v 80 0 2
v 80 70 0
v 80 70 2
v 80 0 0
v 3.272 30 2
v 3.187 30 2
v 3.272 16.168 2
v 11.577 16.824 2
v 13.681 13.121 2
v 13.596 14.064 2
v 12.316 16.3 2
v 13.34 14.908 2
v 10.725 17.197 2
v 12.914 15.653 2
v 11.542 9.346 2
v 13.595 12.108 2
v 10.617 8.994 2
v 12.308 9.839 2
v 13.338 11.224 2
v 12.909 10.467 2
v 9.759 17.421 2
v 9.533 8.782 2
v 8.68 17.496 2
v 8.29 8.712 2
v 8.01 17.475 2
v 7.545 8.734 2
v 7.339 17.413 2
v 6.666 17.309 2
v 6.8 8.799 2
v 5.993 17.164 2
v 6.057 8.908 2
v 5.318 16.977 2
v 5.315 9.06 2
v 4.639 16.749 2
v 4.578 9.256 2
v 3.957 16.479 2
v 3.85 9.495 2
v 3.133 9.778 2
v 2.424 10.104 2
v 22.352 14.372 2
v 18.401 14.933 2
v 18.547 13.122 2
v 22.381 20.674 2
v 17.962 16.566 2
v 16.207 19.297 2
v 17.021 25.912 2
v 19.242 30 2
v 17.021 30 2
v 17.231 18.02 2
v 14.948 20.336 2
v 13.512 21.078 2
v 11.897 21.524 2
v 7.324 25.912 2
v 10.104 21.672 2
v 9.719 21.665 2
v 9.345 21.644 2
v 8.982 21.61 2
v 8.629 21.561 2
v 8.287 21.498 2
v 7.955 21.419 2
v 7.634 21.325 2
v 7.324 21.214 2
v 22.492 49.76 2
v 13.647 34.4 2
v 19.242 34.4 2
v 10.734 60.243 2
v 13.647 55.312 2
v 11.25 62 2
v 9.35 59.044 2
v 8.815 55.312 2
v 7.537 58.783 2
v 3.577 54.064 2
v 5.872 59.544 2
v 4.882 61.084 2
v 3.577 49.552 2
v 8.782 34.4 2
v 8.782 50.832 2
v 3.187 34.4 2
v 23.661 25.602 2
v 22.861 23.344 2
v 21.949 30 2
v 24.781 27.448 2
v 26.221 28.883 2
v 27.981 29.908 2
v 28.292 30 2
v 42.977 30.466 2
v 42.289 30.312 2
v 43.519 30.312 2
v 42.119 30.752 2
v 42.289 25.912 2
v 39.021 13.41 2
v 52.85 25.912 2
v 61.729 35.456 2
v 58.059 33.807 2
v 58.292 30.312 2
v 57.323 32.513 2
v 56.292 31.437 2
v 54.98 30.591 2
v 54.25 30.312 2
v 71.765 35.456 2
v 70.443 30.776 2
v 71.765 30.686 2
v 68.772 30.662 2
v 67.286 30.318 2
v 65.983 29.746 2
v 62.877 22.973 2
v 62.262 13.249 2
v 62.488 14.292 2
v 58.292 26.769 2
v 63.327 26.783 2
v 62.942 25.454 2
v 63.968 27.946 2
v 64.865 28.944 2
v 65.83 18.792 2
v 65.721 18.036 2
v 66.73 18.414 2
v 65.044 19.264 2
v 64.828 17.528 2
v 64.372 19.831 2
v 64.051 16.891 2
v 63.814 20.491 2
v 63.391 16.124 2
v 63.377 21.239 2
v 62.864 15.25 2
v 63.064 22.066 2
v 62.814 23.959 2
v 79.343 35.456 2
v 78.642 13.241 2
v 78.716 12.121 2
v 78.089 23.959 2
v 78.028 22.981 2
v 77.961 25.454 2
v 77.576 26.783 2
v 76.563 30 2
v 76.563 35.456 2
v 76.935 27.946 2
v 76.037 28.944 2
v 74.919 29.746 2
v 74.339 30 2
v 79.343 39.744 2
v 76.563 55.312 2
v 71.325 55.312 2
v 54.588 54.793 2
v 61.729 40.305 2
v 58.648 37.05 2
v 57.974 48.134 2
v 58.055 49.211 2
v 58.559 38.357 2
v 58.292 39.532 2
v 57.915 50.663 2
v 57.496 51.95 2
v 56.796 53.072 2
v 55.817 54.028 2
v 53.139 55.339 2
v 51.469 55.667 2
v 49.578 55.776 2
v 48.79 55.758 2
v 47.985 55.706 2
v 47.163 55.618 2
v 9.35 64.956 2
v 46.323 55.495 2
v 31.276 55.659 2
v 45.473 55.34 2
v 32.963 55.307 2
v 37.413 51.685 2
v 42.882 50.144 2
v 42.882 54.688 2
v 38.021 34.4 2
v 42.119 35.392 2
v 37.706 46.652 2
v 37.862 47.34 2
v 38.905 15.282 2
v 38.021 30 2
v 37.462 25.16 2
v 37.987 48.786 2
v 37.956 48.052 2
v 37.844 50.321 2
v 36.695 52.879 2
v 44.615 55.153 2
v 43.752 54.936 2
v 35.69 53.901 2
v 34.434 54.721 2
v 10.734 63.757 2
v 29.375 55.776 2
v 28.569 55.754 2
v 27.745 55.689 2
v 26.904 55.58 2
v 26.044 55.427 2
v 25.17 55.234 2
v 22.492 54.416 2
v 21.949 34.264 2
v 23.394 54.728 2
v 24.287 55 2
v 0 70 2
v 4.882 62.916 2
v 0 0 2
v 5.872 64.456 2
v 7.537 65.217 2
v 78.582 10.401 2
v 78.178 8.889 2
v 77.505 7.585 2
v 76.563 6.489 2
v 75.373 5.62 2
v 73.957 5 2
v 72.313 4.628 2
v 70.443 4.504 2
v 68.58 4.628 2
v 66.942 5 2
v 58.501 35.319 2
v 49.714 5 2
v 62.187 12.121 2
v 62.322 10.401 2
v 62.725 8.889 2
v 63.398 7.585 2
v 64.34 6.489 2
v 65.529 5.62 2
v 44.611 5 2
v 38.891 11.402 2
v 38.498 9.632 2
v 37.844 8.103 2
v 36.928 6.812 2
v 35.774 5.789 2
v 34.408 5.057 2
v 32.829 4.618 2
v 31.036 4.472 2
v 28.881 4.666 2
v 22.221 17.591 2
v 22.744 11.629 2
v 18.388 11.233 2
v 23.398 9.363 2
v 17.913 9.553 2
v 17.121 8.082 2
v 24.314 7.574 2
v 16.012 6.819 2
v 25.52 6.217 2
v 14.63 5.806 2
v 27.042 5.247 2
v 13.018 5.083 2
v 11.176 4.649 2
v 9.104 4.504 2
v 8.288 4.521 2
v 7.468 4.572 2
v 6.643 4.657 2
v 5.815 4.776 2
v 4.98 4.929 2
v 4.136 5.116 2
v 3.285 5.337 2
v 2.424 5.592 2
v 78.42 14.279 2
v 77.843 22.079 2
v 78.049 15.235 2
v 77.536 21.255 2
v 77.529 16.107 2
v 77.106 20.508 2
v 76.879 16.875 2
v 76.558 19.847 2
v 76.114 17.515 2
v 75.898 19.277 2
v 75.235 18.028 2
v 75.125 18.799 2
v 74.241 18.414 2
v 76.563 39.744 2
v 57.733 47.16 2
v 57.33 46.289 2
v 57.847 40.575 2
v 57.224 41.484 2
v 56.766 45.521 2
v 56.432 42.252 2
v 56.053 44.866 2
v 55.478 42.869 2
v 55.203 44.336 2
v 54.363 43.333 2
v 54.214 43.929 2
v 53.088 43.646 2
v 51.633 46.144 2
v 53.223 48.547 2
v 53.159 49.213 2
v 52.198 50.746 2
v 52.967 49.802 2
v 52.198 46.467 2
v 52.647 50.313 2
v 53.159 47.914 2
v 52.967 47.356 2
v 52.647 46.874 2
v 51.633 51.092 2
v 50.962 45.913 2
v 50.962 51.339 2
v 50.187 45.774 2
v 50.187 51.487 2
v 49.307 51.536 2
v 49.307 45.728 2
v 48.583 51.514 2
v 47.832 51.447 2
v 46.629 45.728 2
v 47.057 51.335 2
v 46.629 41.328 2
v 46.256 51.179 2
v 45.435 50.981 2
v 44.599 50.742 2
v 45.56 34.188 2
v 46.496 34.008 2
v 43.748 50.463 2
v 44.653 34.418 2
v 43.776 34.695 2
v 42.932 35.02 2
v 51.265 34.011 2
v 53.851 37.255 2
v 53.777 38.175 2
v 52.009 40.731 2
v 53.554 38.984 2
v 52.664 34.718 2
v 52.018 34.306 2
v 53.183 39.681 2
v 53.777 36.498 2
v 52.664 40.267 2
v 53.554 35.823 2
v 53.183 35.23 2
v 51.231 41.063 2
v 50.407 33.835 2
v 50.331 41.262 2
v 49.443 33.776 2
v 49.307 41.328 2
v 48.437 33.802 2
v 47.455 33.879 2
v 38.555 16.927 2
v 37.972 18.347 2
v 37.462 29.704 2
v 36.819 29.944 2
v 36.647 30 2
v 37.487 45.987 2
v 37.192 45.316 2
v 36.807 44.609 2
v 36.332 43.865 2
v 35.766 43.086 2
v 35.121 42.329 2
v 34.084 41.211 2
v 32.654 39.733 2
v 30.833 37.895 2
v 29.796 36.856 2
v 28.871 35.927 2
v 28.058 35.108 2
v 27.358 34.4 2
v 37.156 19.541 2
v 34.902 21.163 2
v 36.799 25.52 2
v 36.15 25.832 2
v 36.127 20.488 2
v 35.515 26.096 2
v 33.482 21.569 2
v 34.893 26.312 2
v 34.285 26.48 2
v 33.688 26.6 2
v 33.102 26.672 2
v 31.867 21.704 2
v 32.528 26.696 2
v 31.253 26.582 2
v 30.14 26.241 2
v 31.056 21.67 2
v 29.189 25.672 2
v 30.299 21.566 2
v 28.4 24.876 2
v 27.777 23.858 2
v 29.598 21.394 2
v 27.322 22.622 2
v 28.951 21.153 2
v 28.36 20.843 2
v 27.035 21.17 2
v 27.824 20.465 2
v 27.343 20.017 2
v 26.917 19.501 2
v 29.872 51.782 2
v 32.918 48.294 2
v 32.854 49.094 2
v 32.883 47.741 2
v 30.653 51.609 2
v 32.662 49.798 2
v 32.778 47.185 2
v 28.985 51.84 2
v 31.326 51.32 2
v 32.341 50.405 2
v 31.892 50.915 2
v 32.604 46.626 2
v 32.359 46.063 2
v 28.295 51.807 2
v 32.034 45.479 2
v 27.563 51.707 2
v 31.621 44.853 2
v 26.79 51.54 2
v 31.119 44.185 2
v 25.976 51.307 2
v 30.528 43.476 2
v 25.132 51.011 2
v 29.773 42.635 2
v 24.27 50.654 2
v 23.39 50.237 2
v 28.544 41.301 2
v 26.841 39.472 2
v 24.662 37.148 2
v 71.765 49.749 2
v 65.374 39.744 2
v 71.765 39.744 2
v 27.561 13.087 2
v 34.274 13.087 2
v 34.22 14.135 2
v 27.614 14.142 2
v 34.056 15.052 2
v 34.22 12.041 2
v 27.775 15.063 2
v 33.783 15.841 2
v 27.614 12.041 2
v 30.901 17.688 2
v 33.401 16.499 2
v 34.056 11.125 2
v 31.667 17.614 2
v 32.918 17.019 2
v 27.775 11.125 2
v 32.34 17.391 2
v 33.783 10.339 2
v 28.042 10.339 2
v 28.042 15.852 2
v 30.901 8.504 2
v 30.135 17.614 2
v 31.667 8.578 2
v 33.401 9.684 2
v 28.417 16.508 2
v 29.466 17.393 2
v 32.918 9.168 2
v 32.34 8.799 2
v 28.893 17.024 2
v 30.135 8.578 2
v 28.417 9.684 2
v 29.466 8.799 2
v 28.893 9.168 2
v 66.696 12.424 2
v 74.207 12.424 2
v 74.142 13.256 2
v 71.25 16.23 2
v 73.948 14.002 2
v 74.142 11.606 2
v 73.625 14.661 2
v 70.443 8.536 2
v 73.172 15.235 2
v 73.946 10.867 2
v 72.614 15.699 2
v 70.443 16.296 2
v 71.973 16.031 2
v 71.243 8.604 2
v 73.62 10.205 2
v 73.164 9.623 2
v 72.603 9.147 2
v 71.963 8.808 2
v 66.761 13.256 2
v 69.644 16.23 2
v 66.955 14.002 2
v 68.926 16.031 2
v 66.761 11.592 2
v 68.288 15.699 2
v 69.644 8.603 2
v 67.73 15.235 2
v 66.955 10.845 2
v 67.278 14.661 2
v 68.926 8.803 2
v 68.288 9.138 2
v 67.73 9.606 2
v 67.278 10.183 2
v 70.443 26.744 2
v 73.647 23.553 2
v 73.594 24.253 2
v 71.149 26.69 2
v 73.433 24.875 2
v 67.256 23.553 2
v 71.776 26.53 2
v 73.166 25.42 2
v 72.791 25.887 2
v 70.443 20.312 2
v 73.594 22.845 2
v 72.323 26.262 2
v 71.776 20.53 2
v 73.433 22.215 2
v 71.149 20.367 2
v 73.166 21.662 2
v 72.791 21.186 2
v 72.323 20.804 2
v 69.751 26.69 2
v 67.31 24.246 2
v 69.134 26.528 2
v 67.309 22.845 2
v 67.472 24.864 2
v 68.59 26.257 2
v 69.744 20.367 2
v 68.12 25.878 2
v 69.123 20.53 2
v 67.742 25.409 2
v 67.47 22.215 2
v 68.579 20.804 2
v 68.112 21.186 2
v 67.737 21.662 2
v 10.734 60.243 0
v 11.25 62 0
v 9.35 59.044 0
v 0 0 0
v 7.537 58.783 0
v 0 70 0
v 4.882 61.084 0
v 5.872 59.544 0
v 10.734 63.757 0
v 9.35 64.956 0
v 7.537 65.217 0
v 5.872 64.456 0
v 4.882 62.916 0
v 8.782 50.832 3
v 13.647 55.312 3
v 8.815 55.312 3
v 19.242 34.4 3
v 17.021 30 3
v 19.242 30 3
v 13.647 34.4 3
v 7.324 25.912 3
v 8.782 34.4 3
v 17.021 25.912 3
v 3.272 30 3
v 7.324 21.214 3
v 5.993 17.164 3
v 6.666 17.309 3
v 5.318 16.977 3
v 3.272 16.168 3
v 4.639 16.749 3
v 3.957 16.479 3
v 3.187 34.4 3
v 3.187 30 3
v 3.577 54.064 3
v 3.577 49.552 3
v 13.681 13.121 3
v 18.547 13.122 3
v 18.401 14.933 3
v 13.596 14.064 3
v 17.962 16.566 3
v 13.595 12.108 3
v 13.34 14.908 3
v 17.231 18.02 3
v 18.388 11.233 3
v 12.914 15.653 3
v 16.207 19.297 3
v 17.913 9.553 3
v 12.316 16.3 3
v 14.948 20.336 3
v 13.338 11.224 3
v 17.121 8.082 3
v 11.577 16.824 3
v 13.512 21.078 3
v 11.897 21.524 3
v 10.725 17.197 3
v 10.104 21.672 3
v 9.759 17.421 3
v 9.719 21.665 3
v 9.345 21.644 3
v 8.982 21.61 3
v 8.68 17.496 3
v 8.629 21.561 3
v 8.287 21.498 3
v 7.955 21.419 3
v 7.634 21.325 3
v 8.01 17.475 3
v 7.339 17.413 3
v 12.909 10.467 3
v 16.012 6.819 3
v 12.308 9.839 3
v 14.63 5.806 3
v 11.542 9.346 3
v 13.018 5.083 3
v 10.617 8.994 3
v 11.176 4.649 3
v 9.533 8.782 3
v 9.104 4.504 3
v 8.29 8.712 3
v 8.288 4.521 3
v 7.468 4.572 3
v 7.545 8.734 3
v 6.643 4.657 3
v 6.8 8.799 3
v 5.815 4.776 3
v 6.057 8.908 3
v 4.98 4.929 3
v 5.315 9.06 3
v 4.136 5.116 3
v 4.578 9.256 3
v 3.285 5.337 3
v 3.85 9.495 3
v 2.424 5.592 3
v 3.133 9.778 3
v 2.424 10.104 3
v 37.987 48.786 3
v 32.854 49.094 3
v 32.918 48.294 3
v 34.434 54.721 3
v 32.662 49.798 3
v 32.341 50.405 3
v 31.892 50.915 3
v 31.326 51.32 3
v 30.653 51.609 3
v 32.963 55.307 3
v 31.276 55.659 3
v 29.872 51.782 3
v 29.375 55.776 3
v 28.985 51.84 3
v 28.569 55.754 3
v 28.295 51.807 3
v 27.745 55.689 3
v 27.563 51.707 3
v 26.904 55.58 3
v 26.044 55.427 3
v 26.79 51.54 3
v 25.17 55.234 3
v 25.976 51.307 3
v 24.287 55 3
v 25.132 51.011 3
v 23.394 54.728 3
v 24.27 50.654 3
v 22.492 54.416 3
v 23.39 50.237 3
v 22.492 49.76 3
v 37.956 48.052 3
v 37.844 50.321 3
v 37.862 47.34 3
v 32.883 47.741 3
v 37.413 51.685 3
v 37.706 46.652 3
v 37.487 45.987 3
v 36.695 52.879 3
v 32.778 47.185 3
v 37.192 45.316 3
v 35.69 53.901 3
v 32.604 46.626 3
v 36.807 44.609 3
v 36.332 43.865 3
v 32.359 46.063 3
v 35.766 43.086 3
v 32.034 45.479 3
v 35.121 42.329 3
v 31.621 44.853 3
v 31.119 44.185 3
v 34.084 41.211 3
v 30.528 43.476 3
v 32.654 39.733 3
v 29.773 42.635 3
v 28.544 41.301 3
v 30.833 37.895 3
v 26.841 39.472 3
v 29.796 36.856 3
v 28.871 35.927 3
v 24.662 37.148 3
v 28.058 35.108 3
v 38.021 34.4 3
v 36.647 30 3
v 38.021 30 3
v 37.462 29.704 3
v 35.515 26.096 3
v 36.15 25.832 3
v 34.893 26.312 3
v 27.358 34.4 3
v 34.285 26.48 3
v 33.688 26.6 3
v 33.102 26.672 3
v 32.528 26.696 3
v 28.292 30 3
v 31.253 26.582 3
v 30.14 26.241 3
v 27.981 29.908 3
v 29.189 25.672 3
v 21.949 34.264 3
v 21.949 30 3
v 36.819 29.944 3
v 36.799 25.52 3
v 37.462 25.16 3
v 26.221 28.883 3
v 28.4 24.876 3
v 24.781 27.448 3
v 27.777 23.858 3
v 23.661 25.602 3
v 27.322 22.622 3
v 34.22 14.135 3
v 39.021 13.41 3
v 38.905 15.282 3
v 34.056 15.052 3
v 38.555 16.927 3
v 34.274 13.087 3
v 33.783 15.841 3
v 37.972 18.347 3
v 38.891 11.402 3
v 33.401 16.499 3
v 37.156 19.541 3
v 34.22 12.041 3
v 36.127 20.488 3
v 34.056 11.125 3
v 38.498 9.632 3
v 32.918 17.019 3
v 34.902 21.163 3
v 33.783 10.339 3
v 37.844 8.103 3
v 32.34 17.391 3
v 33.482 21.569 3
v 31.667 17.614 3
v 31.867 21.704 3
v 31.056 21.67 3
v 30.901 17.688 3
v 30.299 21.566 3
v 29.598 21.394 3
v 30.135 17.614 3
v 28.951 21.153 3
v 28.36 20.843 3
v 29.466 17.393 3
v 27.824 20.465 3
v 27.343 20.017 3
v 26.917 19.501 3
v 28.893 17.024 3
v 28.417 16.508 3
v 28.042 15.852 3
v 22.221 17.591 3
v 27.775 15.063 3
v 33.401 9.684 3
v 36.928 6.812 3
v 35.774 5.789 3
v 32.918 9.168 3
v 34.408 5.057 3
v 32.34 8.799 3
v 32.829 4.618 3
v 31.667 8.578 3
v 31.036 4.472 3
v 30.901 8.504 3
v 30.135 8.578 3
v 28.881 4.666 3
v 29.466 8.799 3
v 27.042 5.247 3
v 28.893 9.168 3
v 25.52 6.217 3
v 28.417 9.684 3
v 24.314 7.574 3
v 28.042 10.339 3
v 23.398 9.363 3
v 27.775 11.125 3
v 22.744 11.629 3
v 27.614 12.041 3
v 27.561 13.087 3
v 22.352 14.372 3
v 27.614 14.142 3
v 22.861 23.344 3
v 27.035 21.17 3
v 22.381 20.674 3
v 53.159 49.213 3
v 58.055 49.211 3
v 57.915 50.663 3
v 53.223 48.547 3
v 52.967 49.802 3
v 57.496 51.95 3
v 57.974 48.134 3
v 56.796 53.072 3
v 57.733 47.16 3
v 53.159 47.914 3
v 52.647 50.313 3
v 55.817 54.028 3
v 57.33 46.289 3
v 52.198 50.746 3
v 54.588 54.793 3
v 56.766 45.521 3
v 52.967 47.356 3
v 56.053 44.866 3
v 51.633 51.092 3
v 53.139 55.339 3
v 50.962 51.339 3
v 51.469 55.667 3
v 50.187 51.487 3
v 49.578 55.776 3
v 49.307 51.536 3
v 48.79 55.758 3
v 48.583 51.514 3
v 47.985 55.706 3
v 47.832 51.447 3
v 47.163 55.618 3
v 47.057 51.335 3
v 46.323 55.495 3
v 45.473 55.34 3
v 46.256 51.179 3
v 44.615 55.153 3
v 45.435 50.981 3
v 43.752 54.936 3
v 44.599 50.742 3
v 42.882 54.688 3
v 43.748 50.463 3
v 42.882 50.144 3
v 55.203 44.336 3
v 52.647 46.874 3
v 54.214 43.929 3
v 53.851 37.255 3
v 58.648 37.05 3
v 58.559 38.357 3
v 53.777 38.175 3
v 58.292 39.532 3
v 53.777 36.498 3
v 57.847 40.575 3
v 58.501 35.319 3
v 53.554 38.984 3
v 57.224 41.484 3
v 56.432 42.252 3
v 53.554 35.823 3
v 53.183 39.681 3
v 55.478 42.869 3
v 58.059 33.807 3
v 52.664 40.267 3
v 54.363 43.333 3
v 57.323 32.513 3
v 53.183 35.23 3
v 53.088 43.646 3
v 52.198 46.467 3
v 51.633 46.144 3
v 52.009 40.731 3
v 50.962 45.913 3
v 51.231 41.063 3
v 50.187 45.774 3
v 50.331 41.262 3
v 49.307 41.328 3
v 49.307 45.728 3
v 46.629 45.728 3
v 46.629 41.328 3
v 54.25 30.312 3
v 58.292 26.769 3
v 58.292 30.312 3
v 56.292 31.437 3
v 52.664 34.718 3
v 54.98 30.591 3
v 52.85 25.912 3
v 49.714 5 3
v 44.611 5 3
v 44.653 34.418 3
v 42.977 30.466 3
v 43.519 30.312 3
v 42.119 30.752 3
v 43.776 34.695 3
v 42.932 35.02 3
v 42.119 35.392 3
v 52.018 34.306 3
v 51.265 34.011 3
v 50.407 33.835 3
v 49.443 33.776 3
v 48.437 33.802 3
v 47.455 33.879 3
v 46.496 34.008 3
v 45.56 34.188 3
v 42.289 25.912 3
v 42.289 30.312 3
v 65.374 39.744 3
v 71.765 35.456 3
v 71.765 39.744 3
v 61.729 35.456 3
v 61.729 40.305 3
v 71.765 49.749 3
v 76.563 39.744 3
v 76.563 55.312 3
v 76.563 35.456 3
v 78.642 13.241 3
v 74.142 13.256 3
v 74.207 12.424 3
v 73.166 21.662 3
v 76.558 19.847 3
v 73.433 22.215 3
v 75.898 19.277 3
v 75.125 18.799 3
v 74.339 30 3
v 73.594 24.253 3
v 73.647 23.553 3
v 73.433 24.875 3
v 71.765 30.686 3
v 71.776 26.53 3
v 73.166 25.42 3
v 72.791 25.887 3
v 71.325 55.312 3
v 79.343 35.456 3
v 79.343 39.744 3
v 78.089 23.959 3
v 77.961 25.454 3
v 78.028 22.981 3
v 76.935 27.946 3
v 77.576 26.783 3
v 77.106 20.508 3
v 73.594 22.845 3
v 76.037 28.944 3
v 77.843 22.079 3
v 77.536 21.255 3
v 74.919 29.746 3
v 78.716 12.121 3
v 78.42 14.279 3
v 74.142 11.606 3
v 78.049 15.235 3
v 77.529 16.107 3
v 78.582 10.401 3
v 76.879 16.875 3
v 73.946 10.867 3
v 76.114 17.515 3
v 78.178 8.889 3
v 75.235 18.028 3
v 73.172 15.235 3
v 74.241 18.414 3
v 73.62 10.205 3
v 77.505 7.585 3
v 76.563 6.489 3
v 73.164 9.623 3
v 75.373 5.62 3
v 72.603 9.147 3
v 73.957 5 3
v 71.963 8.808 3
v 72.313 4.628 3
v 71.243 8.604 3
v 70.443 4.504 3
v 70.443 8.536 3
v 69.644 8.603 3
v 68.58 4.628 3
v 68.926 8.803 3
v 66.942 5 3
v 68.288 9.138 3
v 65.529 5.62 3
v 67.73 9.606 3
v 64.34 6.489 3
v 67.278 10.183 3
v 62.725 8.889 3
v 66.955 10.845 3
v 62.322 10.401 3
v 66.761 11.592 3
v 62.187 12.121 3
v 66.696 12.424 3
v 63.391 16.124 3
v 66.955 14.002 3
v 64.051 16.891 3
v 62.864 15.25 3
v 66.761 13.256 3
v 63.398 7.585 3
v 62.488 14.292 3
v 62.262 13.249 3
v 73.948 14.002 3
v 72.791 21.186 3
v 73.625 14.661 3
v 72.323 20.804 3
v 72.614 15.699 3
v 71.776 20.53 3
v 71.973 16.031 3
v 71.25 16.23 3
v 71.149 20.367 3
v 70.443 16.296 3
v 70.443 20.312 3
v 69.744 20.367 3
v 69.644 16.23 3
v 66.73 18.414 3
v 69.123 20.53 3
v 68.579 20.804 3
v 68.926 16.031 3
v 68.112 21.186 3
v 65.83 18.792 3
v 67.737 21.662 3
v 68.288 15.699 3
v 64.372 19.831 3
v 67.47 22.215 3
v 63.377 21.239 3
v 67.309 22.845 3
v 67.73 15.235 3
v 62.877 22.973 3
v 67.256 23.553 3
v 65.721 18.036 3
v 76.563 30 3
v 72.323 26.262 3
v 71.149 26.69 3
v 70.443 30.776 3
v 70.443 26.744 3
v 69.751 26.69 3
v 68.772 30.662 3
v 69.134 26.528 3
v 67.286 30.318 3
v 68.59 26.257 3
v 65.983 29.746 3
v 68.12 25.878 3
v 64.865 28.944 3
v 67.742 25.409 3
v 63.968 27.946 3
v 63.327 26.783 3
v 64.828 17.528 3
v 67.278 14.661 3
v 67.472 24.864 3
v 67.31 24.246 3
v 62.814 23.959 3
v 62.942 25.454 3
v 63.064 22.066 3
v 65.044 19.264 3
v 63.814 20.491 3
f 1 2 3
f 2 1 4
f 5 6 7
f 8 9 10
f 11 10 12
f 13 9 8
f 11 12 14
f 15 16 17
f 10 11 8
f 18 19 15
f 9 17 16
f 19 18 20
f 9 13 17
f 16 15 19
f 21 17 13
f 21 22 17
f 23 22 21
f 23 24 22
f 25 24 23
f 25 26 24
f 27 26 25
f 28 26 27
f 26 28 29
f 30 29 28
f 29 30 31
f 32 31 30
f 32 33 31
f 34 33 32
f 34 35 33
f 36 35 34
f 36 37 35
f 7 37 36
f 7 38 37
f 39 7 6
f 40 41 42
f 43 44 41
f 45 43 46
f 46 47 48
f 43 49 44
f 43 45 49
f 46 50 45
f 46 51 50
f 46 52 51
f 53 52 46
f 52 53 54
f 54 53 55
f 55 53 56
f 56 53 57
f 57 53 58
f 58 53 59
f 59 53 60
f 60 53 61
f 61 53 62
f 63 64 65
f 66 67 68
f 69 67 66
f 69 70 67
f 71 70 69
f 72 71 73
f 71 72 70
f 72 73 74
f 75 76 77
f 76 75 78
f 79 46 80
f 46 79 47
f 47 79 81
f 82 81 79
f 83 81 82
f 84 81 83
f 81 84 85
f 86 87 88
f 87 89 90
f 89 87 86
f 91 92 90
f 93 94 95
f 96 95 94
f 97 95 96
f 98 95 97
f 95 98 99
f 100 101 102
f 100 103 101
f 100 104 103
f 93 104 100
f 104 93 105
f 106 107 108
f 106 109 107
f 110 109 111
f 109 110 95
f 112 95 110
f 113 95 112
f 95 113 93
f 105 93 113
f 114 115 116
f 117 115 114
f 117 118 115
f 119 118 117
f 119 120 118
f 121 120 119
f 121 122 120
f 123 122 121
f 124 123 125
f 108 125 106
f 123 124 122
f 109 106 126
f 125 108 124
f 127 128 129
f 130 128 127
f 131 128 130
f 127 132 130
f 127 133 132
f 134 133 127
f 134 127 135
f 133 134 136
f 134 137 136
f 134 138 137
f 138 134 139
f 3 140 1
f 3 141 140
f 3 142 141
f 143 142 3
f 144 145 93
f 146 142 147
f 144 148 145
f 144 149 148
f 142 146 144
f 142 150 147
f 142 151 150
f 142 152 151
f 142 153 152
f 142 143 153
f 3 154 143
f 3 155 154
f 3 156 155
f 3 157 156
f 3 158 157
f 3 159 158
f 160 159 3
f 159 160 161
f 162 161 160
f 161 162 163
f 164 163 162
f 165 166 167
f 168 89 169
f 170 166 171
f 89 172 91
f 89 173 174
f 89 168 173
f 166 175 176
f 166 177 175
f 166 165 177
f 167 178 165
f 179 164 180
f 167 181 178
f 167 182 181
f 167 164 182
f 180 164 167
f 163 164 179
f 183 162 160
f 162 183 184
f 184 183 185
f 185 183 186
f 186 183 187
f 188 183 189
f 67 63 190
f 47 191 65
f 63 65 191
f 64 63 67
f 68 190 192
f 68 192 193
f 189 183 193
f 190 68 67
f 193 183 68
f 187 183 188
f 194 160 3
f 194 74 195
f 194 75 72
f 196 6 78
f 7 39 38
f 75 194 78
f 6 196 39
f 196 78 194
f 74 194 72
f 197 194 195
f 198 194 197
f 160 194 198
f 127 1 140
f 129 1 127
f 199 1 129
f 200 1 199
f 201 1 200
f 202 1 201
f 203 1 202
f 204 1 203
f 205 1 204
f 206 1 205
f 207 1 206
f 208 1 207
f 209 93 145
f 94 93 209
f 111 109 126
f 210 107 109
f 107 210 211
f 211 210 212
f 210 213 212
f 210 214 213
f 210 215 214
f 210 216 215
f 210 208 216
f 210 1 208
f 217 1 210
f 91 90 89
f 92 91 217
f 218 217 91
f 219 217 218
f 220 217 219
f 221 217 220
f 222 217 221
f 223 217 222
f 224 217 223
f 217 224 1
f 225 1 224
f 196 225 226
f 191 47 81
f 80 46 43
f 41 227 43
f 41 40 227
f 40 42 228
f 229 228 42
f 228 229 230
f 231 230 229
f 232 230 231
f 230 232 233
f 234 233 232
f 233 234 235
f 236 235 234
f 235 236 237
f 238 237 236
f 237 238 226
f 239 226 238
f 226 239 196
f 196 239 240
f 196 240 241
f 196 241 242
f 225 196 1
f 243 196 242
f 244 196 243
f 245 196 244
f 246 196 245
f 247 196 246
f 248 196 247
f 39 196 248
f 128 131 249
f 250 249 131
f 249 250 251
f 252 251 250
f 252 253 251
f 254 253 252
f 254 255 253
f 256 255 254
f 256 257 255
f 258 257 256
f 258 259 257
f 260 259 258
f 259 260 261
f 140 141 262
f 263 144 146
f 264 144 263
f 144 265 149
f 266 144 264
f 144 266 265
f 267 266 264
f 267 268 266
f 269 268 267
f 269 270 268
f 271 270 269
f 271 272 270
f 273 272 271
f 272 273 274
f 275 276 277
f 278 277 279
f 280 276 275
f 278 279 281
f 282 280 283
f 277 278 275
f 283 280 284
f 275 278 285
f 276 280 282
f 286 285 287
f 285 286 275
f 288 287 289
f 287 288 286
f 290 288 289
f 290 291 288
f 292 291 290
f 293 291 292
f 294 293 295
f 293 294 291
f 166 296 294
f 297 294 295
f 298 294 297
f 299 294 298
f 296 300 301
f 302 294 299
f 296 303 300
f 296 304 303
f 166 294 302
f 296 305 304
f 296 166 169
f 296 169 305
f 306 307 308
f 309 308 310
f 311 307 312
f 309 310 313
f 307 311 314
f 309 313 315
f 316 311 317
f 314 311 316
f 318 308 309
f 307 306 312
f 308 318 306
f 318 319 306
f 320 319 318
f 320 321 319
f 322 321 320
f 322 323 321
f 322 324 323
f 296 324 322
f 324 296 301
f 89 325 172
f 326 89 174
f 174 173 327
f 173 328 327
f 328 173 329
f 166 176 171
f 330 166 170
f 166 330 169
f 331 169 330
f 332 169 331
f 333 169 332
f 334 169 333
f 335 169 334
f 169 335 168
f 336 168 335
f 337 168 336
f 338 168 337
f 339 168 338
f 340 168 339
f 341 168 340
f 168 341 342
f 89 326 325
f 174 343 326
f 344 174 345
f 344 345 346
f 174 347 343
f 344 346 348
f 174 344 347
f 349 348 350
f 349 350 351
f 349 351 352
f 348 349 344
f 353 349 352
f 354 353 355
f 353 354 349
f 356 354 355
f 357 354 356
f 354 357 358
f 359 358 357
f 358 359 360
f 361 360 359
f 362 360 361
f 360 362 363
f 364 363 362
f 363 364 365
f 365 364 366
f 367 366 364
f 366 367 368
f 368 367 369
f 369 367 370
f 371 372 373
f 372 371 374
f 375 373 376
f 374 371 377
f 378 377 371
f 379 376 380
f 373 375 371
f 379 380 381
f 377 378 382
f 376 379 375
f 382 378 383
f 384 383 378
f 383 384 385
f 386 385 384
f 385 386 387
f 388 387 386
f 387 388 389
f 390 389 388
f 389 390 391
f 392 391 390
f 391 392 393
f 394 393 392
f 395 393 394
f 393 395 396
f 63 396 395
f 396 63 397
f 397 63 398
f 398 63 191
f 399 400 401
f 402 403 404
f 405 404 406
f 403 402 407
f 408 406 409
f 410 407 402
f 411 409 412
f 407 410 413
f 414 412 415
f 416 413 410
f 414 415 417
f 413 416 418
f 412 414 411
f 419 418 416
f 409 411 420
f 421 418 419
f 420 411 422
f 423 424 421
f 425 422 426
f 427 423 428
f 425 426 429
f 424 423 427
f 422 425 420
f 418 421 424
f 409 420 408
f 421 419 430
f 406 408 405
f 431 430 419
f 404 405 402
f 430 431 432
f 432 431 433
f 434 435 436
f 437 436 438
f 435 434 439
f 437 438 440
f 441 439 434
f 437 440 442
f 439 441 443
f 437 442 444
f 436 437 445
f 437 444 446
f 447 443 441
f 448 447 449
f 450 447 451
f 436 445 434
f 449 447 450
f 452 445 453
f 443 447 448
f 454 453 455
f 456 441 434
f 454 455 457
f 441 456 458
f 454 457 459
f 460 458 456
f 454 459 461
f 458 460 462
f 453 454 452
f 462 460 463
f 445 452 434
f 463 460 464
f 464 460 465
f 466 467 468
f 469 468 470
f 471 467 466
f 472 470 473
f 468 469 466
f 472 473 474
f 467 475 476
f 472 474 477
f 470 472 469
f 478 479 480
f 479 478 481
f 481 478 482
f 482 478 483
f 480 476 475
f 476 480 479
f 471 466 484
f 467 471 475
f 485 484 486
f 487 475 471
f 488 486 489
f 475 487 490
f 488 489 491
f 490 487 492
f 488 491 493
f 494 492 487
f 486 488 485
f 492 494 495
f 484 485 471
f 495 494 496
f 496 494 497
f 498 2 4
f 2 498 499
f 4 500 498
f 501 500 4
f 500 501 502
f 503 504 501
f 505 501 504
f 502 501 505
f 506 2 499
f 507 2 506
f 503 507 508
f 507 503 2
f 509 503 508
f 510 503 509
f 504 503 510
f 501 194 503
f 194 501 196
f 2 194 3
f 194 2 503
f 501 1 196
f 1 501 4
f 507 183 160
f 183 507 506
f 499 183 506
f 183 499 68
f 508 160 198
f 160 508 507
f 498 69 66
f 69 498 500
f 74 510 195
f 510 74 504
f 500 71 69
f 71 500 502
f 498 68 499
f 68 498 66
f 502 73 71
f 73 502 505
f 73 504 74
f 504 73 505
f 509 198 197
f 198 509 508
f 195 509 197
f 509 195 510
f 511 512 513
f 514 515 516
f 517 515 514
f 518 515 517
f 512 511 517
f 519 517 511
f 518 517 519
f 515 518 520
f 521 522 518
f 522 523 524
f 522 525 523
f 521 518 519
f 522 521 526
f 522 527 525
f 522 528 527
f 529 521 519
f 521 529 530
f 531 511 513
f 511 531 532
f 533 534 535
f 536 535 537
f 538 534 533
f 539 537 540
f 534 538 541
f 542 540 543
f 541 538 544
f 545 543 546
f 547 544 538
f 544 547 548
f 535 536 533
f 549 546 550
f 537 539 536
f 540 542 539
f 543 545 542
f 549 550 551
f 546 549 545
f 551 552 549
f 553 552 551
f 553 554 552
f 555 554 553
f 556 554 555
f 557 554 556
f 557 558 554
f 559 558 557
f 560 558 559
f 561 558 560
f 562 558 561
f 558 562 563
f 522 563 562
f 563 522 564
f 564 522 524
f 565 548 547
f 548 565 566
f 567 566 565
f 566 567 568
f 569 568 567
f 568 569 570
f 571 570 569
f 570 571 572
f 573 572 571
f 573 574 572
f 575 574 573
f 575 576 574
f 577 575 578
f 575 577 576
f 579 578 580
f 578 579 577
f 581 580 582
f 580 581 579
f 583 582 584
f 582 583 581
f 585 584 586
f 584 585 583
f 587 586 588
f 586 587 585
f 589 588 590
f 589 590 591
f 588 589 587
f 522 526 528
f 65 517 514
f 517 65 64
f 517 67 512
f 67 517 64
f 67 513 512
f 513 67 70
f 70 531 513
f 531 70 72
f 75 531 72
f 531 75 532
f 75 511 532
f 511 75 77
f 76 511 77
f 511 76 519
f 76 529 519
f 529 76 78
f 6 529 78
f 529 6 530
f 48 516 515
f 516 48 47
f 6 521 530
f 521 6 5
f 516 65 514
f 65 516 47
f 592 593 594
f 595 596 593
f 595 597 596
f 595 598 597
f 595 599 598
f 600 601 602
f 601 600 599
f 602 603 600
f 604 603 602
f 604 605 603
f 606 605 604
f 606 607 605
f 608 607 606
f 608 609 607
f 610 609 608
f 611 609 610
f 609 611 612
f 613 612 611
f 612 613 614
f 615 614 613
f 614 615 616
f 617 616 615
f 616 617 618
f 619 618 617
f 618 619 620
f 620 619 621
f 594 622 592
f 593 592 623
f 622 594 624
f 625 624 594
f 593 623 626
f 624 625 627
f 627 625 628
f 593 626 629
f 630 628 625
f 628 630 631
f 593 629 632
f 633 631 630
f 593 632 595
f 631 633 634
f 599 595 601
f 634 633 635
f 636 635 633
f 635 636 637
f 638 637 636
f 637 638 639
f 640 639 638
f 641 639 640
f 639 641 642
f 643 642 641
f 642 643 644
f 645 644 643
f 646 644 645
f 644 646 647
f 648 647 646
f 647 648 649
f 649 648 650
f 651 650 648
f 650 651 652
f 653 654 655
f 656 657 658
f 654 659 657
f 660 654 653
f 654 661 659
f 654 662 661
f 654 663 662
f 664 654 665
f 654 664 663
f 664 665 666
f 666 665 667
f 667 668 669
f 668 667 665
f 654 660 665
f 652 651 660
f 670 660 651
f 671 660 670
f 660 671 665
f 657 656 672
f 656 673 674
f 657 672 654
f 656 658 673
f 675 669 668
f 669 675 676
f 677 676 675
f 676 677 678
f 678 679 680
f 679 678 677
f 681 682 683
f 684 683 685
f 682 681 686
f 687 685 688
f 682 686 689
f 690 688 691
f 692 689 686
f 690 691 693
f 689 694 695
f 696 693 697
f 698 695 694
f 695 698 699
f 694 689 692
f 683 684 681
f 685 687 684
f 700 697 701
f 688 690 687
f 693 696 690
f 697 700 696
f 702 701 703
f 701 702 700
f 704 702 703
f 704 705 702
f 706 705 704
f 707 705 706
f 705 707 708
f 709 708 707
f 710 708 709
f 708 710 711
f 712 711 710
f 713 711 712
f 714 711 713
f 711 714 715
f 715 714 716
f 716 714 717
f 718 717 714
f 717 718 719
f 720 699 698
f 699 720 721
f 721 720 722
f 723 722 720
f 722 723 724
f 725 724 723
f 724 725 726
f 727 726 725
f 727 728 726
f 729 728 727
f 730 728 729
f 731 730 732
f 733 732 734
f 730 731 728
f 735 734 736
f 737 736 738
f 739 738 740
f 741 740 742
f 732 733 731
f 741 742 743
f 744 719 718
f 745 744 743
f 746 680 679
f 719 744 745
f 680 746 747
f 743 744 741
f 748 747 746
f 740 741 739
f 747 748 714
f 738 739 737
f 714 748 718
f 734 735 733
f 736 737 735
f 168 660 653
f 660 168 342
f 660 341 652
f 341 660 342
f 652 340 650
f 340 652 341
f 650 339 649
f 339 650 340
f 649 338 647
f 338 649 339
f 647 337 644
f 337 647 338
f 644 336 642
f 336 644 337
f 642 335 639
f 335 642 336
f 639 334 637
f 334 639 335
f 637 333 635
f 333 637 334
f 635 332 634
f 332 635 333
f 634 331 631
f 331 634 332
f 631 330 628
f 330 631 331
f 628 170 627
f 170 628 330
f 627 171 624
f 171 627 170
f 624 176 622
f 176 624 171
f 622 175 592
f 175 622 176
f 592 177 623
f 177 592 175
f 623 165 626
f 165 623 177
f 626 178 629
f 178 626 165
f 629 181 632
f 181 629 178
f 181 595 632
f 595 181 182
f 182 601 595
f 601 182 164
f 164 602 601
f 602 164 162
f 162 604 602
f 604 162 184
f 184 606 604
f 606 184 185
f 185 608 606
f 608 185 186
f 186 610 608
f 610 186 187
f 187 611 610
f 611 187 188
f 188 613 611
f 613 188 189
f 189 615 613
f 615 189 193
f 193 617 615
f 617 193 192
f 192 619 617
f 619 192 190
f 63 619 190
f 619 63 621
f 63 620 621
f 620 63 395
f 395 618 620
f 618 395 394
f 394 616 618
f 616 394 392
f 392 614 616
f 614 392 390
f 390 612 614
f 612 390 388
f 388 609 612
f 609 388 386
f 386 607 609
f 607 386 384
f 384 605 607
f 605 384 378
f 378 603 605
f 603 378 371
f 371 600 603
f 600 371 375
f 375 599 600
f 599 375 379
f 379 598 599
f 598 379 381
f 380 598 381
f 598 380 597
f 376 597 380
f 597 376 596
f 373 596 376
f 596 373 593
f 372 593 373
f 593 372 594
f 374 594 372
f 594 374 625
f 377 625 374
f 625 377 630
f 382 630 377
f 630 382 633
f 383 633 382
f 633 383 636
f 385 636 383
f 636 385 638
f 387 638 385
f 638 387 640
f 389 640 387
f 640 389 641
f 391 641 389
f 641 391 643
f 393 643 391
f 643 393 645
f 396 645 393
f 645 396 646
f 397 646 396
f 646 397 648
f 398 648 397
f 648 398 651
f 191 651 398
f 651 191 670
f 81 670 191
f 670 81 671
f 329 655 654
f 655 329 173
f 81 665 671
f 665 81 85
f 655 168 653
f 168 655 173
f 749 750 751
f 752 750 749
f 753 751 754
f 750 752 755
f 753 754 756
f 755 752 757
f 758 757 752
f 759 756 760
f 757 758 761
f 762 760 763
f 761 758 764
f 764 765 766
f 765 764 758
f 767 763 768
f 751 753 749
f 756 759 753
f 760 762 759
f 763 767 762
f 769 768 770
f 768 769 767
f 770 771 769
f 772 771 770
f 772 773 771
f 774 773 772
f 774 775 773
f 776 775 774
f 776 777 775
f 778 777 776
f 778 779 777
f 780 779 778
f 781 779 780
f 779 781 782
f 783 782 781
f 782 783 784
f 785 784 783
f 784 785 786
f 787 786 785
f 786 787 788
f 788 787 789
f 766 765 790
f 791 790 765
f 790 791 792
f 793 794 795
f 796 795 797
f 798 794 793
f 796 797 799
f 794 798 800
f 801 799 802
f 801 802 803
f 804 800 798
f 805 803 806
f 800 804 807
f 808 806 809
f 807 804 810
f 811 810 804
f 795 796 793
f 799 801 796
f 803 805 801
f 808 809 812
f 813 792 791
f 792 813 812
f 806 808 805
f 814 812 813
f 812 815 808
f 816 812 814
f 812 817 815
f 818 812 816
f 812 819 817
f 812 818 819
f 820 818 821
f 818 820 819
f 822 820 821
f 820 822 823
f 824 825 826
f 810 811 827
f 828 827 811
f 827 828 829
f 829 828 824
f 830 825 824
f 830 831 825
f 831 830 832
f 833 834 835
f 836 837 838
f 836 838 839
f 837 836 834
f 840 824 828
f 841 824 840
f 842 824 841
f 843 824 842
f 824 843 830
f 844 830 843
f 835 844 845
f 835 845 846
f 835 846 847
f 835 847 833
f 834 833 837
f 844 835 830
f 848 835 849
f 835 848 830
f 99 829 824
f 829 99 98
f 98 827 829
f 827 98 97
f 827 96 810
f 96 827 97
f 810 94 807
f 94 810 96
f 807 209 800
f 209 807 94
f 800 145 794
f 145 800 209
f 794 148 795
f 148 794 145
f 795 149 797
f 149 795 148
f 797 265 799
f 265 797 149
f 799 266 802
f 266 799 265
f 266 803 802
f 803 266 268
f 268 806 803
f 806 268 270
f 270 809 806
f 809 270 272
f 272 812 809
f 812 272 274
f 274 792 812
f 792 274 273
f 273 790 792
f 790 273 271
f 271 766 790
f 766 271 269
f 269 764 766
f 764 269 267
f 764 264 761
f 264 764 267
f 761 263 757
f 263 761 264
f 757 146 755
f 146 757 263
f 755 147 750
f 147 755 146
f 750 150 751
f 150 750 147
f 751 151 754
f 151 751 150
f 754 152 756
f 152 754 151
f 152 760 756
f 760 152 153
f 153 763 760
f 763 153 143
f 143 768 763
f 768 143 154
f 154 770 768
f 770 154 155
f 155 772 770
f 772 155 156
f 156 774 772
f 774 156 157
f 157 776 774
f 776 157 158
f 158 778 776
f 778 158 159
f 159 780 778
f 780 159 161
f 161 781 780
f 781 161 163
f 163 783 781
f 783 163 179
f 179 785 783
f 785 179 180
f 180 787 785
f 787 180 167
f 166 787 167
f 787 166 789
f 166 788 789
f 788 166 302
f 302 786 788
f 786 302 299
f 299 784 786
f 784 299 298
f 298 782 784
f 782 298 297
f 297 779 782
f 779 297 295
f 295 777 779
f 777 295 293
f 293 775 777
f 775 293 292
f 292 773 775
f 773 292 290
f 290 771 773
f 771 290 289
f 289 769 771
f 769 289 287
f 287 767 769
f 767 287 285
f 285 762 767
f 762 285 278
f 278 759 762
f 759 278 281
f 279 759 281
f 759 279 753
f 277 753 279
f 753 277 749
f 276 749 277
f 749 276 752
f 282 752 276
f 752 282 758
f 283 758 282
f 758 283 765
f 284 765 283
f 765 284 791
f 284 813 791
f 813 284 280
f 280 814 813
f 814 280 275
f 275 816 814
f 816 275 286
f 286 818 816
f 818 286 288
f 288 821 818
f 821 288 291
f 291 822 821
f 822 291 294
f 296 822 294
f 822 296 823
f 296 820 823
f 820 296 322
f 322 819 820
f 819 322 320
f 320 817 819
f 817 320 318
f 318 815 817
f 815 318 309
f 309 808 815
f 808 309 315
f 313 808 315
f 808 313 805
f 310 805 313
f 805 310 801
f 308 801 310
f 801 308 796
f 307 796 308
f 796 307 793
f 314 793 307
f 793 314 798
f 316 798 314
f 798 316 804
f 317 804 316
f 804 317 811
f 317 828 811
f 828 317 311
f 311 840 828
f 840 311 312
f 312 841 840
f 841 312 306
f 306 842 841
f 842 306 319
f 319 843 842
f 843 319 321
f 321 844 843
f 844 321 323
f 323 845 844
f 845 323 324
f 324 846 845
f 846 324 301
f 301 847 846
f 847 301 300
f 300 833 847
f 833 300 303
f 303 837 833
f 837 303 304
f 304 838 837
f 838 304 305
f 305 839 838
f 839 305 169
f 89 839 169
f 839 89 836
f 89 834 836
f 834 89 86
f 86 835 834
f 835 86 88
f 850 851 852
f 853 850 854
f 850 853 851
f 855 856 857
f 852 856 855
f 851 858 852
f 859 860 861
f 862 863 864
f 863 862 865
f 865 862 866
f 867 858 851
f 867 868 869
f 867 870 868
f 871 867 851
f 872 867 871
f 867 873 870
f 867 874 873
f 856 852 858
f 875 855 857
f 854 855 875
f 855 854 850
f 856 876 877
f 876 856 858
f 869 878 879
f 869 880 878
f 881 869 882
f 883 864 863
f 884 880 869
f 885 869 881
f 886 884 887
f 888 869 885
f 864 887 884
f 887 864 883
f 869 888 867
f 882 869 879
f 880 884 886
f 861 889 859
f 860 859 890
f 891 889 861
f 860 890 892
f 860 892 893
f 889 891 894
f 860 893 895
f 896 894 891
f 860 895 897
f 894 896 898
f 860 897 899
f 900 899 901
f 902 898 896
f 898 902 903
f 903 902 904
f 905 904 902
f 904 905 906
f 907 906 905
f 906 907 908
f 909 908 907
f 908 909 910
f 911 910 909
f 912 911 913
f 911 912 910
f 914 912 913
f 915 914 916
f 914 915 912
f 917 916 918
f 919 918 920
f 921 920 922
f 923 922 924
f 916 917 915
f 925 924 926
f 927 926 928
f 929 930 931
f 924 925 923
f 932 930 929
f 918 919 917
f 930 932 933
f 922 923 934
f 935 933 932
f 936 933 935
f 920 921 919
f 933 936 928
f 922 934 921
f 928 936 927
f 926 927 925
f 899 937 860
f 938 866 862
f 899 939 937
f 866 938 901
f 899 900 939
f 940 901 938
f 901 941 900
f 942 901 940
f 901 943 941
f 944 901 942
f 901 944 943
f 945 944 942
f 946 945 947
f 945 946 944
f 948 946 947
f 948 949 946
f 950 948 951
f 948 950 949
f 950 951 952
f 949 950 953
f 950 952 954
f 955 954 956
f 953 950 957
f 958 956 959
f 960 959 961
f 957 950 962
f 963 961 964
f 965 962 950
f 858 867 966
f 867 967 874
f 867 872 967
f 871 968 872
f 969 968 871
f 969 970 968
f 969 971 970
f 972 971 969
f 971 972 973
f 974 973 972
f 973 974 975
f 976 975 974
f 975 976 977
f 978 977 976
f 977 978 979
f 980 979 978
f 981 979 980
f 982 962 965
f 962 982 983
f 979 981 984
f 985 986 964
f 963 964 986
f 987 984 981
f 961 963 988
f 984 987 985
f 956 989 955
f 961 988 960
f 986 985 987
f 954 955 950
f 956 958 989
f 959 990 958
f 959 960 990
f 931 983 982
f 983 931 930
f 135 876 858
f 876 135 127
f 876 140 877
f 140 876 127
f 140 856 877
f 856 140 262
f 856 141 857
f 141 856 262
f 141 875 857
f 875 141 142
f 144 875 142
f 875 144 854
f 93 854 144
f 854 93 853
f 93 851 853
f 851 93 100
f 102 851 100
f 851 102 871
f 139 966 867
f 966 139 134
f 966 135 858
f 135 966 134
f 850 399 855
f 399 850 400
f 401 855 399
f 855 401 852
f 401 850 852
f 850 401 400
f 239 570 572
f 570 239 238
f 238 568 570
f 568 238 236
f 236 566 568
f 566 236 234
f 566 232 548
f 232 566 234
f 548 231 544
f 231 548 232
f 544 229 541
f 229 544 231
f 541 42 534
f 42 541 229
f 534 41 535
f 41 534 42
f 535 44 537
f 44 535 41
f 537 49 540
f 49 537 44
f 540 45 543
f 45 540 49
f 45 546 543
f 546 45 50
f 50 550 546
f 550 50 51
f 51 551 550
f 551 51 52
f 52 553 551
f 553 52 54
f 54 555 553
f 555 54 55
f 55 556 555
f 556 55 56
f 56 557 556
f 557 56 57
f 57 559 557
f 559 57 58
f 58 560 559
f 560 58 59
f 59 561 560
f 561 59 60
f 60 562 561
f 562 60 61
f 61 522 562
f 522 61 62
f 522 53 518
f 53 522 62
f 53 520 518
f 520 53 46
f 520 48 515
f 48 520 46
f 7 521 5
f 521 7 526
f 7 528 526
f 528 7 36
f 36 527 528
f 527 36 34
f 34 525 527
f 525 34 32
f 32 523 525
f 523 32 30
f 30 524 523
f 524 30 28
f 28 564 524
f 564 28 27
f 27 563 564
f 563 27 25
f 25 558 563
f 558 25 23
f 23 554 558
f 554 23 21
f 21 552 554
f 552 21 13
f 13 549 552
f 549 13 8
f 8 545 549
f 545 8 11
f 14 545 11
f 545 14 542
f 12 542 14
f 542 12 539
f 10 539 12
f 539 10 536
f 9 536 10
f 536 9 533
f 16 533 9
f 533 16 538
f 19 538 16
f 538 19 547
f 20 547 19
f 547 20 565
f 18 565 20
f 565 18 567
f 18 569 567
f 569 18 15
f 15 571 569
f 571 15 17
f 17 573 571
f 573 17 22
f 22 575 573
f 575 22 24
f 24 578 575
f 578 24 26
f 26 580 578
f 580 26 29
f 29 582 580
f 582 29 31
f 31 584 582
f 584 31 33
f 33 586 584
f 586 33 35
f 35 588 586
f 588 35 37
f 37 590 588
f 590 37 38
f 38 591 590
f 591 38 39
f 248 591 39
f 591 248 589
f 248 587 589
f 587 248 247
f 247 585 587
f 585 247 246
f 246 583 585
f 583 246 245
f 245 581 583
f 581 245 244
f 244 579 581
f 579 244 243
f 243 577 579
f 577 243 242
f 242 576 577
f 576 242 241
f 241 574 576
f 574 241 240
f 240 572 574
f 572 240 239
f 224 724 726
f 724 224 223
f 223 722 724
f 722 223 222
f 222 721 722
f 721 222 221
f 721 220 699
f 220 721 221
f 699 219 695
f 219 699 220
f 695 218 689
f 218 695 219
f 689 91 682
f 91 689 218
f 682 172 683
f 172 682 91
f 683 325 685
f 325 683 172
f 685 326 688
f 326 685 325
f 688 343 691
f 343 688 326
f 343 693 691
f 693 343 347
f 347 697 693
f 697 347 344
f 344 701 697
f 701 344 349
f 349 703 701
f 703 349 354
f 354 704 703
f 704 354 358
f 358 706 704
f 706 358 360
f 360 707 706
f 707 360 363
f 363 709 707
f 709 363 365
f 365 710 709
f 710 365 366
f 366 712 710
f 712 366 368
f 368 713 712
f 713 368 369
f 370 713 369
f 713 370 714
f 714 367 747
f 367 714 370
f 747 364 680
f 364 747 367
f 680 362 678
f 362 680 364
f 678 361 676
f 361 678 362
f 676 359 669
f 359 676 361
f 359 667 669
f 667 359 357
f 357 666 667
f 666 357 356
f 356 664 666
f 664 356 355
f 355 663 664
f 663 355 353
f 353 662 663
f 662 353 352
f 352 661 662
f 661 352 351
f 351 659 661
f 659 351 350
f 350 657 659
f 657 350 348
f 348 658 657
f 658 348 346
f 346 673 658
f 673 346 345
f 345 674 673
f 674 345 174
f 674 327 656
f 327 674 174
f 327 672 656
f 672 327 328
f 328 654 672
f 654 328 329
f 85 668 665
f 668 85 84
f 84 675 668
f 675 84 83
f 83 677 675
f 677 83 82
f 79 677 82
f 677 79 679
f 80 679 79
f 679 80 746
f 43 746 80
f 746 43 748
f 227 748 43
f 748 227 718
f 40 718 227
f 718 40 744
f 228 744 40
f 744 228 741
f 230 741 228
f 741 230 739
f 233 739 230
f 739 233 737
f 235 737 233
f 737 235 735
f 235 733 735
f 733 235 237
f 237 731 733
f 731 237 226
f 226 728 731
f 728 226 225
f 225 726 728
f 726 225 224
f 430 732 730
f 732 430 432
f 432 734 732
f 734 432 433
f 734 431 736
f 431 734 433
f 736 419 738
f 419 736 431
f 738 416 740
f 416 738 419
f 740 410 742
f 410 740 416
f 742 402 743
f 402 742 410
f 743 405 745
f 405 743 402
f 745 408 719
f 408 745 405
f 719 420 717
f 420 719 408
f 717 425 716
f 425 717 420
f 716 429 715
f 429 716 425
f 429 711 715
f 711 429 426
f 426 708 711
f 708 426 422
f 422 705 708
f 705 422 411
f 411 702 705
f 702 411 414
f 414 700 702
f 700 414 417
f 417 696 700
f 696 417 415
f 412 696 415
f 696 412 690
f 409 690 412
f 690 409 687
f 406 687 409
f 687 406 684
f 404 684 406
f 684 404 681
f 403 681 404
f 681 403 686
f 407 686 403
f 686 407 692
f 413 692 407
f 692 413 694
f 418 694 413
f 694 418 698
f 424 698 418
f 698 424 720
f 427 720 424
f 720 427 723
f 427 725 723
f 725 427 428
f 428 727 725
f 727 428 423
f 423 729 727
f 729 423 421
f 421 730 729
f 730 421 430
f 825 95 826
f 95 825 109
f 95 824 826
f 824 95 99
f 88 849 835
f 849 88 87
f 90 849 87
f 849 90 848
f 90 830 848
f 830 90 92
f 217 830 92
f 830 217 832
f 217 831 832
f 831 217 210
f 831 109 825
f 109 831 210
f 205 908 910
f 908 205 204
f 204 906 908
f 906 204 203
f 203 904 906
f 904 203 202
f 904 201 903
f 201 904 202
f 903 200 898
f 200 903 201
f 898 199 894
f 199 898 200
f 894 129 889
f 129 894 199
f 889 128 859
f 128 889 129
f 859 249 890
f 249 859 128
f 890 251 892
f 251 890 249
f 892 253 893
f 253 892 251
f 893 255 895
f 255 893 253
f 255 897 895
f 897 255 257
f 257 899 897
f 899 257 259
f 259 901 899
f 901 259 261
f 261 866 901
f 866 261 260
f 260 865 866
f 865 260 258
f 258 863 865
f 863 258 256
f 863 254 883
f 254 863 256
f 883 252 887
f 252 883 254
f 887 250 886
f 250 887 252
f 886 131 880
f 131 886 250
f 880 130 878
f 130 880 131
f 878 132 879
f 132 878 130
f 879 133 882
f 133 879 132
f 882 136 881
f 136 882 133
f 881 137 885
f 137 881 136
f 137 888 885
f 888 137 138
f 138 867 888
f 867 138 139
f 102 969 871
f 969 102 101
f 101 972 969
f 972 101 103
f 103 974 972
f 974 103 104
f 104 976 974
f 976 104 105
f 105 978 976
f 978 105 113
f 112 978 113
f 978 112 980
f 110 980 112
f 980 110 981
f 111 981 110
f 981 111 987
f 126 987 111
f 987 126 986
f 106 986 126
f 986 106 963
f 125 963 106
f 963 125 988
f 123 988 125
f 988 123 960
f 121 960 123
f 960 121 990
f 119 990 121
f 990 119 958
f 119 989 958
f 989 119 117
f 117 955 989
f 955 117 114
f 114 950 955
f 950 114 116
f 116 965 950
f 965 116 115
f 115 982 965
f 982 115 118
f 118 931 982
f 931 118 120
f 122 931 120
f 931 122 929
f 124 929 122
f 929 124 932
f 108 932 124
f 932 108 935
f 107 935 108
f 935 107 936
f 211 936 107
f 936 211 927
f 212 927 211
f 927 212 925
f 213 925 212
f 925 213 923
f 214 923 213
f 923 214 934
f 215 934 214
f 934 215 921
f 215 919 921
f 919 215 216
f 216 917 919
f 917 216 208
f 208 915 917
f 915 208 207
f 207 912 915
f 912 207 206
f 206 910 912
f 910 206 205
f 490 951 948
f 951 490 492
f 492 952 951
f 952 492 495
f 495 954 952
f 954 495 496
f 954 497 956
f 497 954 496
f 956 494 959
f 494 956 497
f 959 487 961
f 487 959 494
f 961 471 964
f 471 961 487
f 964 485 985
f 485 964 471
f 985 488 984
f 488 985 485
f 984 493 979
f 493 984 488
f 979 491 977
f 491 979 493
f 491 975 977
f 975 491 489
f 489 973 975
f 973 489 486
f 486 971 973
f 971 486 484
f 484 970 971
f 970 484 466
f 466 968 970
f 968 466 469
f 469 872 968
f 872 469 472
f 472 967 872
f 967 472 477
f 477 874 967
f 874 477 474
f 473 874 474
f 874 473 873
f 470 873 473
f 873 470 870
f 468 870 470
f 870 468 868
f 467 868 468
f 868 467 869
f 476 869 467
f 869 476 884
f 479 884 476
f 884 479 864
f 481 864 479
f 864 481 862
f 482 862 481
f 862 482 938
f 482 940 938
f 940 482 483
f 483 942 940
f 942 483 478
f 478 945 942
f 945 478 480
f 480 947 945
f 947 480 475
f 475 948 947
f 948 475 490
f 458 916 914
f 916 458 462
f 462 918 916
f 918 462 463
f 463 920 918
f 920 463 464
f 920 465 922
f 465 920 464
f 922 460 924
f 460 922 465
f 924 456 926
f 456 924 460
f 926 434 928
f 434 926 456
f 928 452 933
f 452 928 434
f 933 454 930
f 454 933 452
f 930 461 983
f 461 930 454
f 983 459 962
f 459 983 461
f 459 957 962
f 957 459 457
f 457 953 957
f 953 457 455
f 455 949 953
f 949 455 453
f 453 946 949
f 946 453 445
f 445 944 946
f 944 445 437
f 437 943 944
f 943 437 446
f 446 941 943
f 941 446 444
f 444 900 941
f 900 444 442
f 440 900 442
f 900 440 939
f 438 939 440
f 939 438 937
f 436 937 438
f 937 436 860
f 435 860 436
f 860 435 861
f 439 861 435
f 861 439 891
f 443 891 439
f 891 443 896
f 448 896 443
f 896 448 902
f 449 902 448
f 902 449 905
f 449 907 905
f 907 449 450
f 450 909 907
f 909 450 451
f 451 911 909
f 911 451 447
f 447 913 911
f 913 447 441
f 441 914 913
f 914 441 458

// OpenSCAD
font = "FreeMono:style=Bold";

module m1() {
    difference() {
        cube([80,70,2]);
        translate([8,62,-1]) cylinder(d=6.5,h=4);
    }
    translate([0,30,0])
    linear_extrude(3) text("1", font=font, size=25);
}

module m2() {
    translate([20,30,0])
    linear_extrude(3) text("2", font=font,size=25);
}

module m3() {
    translate([40,30,0])
    linear_extrude(3) text("3", font=font,size=25);
}

module m4() {
    translate([60,30,0])
    linear_extrude(3) text("4", font=font,size=25);
}

module m5() {
    translate([0,5,0])
    linear_extrude(3) text("5", font=font,size=25);
}

module m6() {
    translate([20,5,0])
    linear_extrude(3) text("6", font=font,size=25);
}

module m7() {
    translate([40,5,0])
    linear_extrude(3) text("7", font=font,size=25);
}

module m8() {
    translate([60,5,0])
    linear_extrude(3) text("8", font=font,size=25);
}

material = 0;
if (material == 0) {
    color("red") m1();
    color("orange") m2();
    color("yellow") m3();
    color("green") m4();
    color("aqua") m5();
    color("blue") m6();
    color("purple") m7();
    color("violet") m8();
} else if (material == 1) {
    difference() {
        m1();
        m2();
        m3();
        m4();
        m5();
        m6();
        m7();
        m8();
    }
} else if (material == 2) { 
    m2();
} else if (material == 3) { 
    m3();
} else if (material == 4) { 
    m4();
} else if (material == 5) { 
    m5();
} else if (material == 6) { 
    m6();
} else if (material == 7) { 
    m7();
} else if (material == 8) { 
    m8();
}
